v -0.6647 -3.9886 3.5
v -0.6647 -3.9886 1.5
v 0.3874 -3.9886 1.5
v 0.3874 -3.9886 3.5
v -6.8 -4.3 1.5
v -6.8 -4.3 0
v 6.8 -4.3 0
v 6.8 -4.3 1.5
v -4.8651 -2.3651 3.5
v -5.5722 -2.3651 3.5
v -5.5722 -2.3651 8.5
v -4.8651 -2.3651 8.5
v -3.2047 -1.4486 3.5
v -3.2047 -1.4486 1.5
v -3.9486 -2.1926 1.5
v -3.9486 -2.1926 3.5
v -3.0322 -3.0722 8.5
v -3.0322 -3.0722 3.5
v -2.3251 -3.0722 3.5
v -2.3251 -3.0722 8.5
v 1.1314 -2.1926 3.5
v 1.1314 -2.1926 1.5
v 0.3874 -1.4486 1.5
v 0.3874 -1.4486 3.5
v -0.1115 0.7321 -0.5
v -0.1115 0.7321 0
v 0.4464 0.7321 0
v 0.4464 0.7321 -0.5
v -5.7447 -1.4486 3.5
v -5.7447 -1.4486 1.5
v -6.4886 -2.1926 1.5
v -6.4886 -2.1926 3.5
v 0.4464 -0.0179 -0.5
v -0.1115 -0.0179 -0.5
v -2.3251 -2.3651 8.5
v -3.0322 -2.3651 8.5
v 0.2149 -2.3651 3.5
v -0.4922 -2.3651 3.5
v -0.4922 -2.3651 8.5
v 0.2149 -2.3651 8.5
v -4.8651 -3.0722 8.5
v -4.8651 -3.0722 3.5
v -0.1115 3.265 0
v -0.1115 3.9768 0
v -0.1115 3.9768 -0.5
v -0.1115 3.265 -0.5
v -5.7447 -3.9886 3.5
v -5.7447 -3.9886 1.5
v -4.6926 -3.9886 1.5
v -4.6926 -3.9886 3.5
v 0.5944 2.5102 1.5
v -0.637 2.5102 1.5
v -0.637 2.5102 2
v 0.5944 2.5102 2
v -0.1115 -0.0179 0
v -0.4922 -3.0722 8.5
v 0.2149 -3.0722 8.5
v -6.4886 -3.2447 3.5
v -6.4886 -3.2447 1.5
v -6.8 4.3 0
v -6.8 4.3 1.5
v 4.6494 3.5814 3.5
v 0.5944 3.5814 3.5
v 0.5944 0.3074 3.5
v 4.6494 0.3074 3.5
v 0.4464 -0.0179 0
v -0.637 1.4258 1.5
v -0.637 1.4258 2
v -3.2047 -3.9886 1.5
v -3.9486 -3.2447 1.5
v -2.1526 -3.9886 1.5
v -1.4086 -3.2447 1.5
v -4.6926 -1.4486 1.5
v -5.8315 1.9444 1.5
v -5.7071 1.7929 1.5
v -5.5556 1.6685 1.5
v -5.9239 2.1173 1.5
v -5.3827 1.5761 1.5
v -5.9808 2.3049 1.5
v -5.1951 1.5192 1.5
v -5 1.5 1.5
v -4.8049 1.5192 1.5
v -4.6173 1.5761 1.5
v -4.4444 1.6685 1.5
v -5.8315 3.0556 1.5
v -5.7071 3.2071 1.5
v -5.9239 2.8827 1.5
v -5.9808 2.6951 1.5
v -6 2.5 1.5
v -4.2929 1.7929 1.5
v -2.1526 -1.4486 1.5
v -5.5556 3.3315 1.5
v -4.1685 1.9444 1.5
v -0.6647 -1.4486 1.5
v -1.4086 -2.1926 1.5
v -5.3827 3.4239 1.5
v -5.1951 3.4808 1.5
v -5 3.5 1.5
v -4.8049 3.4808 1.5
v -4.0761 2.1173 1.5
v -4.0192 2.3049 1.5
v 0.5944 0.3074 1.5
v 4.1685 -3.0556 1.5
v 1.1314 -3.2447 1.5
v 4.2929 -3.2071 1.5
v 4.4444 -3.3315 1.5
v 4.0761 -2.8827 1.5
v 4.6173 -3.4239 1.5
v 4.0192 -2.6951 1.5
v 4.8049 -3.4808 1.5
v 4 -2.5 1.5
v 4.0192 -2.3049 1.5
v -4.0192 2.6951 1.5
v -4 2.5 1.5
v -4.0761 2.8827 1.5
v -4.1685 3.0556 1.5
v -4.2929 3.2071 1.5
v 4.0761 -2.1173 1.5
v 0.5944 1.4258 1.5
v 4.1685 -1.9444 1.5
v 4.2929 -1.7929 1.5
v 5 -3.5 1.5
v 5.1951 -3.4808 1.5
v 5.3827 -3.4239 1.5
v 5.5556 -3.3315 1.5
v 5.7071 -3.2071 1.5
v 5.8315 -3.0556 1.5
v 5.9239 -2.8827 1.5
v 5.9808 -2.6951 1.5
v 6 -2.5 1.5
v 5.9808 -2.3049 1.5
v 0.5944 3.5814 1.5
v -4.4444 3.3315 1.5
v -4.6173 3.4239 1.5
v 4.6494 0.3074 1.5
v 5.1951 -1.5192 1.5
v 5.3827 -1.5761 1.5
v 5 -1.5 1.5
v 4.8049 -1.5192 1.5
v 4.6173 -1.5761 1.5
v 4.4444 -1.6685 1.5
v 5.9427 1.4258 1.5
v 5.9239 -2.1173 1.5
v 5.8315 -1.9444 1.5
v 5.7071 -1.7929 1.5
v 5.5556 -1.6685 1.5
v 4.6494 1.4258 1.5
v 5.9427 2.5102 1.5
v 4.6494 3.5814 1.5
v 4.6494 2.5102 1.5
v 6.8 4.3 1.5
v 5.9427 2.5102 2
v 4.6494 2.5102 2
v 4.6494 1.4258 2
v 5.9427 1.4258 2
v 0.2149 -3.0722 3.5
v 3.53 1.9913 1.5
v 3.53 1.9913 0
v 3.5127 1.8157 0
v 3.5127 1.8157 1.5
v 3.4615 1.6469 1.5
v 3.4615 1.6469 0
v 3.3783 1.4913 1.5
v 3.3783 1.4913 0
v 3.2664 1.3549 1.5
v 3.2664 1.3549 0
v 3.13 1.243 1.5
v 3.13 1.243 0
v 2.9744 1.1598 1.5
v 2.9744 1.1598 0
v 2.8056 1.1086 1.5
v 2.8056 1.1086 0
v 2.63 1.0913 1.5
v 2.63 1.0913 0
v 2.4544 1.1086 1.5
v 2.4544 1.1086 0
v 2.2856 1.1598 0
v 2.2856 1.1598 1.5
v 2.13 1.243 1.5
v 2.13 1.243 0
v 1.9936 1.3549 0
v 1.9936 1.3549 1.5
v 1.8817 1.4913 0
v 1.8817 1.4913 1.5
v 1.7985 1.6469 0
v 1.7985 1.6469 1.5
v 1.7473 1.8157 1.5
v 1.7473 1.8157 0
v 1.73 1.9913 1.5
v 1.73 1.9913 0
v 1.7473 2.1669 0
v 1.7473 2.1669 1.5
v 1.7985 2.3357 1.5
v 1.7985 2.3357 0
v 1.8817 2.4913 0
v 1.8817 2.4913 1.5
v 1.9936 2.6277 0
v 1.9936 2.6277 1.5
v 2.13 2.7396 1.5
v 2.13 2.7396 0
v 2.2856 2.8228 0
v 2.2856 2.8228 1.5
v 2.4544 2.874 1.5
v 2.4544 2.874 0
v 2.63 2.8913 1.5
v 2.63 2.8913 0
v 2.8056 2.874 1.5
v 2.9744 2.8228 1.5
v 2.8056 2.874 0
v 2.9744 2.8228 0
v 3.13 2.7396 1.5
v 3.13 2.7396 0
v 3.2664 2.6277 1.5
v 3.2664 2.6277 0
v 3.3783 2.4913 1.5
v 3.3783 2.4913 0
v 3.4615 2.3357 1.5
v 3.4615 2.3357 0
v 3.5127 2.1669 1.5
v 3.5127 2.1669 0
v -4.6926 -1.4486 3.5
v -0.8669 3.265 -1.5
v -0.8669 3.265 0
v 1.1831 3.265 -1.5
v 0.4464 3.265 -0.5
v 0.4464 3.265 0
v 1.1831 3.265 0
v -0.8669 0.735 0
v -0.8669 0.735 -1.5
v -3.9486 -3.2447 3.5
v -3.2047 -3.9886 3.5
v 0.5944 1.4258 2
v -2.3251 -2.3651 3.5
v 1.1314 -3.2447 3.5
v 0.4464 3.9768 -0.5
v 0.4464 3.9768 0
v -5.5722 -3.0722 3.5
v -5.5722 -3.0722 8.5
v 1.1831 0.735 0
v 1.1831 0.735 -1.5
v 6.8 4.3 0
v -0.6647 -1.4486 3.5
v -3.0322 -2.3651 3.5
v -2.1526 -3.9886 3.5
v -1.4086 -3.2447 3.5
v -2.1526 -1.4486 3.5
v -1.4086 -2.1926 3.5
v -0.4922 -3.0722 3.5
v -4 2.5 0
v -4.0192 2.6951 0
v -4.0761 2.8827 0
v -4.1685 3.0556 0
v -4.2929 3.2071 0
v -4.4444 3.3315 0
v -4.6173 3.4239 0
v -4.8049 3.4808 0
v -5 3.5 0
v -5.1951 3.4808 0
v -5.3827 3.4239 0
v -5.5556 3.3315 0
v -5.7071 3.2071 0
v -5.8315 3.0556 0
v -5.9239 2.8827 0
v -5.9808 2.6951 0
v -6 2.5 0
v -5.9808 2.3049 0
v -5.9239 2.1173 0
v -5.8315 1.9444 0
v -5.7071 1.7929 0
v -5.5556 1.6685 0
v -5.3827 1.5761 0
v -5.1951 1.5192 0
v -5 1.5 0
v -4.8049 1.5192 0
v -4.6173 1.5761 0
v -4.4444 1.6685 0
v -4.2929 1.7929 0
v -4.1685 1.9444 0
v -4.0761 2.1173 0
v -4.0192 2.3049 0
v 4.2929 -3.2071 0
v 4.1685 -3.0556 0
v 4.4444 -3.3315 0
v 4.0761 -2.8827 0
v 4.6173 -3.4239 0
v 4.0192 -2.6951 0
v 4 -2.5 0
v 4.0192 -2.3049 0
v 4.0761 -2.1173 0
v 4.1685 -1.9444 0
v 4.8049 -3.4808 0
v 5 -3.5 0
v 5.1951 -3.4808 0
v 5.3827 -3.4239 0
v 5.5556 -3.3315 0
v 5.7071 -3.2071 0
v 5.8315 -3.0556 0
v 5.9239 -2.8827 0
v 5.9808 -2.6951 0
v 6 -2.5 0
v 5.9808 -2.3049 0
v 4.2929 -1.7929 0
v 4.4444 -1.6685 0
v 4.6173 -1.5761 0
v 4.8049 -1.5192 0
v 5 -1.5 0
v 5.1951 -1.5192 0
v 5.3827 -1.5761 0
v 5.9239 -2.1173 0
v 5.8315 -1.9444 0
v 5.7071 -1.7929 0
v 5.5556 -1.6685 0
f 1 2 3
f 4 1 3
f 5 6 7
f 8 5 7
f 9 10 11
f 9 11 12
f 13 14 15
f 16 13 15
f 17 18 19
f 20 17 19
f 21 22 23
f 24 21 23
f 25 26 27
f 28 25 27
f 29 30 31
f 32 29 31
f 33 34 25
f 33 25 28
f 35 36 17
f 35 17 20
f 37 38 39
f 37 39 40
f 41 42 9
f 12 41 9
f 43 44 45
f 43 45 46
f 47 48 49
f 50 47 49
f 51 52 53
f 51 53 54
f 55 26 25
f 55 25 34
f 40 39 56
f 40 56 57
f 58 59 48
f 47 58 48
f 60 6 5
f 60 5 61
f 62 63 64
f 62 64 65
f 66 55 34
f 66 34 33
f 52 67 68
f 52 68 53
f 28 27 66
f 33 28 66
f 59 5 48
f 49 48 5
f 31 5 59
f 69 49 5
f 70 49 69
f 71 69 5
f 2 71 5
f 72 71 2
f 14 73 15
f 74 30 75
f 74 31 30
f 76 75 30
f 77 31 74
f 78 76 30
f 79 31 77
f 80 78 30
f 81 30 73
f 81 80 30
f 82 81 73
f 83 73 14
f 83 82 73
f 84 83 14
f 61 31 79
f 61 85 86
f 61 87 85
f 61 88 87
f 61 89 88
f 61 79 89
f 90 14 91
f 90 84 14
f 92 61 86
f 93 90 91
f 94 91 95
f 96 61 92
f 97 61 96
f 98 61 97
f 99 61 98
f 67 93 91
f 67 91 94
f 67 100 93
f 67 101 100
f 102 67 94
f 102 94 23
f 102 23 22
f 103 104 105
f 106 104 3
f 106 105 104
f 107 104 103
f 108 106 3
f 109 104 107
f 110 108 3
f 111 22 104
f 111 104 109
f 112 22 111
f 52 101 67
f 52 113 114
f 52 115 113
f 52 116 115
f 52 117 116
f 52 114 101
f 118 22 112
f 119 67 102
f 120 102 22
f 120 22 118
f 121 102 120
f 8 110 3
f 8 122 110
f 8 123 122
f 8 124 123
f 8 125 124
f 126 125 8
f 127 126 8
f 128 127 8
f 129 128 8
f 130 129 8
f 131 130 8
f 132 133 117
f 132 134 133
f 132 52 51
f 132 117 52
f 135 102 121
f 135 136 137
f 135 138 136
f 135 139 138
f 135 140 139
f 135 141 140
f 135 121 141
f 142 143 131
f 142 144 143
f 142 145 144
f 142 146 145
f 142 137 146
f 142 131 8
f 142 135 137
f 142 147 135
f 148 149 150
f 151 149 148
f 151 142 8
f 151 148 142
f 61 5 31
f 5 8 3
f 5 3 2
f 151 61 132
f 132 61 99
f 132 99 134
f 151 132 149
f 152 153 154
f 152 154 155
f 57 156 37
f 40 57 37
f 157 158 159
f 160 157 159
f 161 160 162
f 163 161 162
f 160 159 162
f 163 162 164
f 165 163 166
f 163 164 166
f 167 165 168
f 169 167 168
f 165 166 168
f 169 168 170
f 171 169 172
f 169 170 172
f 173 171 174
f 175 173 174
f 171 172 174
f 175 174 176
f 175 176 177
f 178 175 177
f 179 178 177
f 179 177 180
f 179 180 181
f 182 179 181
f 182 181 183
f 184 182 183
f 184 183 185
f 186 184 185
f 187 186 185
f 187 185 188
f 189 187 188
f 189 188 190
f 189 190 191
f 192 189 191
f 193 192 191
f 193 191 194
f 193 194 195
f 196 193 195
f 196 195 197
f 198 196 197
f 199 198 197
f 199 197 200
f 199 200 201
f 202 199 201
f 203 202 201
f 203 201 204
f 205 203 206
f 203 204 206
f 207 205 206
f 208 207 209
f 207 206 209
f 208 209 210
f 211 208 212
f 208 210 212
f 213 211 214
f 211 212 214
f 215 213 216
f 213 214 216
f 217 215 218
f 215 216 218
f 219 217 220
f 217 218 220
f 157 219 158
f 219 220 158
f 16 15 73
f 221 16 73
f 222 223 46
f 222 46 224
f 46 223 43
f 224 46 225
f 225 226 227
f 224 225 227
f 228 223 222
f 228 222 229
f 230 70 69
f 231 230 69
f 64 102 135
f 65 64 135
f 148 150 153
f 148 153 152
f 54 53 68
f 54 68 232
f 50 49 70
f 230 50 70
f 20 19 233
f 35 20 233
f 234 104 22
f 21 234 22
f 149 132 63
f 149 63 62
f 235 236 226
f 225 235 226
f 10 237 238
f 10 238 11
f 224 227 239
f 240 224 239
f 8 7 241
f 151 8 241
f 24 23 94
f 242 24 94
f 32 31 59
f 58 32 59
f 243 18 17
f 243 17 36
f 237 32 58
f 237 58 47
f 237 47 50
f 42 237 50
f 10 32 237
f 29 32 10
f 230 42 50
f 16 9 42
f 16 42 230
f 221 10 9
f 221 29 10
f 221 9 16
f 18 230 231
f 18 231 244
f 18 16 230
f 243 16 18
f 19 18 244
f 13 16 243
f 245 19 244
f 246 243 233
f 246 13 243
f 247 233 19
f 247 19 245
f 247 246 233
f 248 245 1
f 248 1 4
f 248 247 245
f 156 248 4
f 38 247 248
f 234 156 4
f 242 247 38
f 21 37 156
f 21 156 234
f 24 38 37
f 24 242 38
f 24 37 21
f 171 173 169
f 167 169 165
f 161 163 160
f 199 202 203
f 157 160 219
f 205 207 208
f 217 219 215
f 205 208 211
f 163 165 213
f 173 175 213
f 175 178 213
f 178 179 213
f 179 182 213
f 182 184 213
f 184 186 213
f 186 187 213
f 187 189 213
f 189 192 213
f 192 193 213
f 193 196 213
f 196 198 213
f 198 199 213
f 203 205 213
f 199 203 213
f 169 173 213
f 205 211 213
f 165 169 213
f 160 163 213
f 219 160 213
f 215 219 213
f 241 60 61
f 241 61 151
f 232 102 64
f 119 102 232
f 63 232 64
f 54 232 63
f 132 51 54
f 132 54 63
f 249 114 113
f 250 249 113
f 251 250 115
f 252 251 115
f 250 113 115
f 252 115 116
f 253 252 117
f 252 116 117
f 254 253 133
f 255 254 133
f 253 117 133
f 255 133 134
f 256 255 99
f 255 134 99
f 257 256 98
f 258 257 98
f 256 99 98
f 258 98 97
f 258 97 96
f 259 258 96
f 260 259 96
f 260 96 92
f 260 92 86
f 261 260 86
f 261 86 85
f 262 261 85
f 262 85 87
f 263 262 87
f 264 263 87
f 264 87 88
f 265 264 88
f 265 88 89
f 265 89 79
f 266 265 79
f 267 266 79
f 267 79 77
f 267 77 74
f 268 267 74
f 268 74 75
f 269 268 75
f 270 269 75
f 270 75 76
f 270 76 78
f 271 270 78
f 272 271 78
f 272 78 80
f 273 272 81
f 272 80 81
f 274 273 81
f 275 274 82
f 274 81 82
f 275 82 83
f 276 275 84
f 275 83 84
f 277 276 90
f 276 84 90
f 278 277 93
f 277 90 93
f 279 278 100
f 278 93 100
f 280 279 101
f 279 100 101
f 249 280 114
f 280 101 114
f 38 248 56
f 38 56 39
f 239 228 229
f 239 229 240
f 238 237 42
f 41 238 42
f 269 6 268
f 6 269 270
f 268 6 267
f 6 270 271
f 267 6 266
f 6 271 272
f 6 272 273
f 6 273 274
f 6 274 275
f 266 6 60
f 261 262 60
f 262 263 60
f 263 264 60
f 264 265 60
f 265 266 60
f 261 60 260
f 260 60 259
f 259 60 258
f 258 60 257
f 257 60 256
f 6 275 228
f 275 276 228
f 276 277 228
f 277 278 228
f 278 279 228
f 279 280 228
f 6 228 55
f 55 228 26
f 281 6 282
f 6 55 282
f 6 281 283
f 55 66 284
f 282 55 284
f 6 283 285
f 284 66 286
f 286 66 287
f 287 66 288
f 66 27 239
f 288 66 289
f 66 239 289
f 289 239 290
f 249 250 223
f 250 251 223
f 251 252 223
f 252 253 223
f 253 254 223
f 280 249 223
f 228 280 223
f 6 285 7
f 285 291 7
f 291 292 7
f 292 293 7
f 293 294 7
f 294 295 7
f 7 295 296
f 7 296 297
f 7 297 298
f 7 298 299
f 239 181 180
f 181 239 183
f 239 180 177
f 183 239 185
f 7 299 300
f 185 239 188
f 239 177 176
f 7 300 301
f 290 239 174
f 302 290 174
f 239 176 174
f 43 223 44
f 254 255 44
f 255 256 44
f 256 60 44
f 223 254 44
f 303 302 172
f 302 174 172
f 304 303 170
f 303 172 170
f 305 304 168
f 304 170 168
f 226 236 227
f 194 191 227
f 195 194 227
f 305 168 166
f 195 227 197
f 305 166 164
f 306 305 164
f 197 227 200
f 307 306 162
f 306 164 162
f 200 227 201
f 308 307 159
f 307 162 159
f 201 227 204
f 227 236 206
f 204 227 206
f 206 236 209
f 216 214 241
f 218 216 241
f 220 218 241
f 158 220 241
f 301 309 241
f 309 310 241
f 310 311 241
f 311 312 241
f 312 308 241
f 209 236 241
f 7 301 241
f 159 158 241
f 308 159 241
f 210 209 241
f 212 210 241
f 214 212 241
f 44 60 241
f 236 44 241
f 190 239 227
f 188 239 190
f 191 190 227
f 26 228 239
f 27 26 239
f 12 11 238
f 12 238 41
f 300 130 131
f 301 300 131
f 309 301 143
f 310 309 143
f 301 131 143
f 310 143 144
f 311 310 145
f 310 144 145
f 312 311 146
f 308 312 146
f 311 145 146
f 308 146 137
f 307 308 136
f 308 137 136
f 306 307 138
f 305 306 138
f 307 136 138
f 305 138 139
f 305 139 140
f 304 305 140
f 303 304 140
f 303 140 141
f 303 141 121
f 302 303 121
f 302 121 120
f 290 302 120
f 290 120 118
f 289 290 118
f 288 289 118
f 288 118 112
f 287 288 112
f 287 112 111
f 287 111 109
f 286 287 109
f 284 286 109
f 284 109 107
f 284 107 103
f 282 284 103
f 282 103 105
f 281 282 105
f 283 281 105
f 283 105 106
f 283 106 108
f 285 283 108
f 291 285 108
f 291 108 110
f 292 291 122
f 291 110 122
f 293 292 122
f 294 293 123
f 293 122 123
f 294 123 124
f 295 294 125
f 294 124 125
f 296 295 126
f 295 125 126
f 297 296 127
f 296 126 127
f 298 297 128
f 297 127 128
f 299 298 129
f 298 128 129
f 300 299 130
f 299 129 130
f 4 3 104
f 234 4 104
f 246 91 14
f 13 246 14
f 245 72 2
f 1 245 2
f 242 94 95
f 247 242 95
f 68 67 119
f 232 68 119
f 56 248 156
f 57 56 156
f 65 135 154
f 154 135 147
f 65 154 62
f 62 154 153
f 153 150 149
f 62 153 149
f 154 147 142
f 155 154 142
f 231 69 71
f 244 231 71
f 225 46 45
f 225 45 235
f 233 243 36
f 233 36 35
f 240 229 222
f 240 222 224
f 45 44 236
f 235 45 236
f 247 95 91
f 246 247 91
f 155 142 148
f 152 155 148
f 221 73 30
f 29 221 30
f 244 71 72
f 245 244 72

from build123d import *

# Parameters (mm, degrees)
SKETCH_W               = 13.6
SKETCH_H               = 8.6
PAD_DEPTH              = 1.5
SKETCH001_R            = 1
POCKET_DEPTH           = 5
SKETCH002_R            = 0.9
POCKET001_DEPTH        = 5
SKETCH003_W            = 4.055027
SKETCH003_H            = 3.273927
PAD001_DEPTH           = 2
SKETCH004_W            = 1.366968
SKETCH004_H            = 1.084461
PAD002_DEPTH           = 0.5
SKETCH005_W            = 2.05
SKETCH005_H            = 2.53
PAD003_DEPTH           = 1.5
SKETCH006_W            = 0.55793
SKETCH006_H            = 0.749967
PAD004_DEPTH           = 0.5
PAD005_DEPTH           = 2
SKETCH008_W            = 0.707107
SKETCH008_H            = 0.707107
PAD006_DEPTH           = 5
LINEARPATTERN_COUNT    = 3
LINEARPATTERN_PITCH    = 2.54
LINEARPATTERN001_COUNT = 3
LINEARPATTERN001_PITCH = 2.54


with BuildPart() as part:
    # Sketch → Pad (new body)
    with BuildSketch(Plane.XY):
        Rectangle(SKETCH_W, SKETCH_H)
    extrude(amount=PAD_DEPTH)

    # Sketch001 (on Face6 of Pad) → Pocket (cut)
    with BuildSketch(Plane.XY.offset(1.5)):
        with Locations((-5, 2.5)):
            Circle(SKETCH001_R)
        with Locations((5, -2.5)):
            Circle(SKETCH001_R)
    extrude(amount=-POCKET_DEPTH, mode=Mode.SUBTRACT)

    # Sketch002 (on Face4 of Pocket) → Pocket001 (cut)
    with BuildSketch(Plane(origin=(0, 0, 0), x_dir=(1, 0, 0), z_dir=(0, 0, -1))):
        with Locations((2.63, -1.991314)):
            Circle(SKETCH002_R)
    extrude(amount=-POCKET001_DEPTH, mode=Mode.SUBTRACT)

    # Sketch003 (on Face5 of Pocket001) → Pad001 (join)
    with BuildSketch(Plane.XY.offset(1.5)):
        with Locations((2.621891, 1.944408)):
            Rectangle(SKETCH003_W, SKETCH003_H)
    extrude(amount=PAD001_DEPTH)

    # Sketch004 (on Face5 of Pad001) → Pad002 (join)
    with BuildSketch(Plane.XY.offset(1.5)):
        with Locations((0.04648, 1.968005)):
            Rectangle(SKETCH004_W, SKETCH004_H)
        with Locations((5.259186, 1.968005)):
            Rectangle(SKETCH004_W, SKETCH004_H)
    extrude(amount=PAD002_DEPTH)

    # Sketch005 (on Face4 of Pad002) → Pad003 (join)
    with BuildSketch(Plane(origin=(0, 0, 0), x_dir=(1, 0, 0), z_dir=(0, 0, -1))):
        with Locations((0.15814, -2)):
            Rectangle(SKETCH005_W, SKETCH005_H)
    extrude(amount=PAD003_DEPTH)

    # Sketch006 (on Face4 of Pad003) → Pad004 (join)
    with BuildSketch(Plane(origin=(0, 0, 0), x_dir=(1, 0, 0), z_dir=(0, 0, -1))):
        with Locations((0.167423, -0.357102)):
            Rectangle(SKETCH006_W, SKETCH006_H)
        with Locations((0.167423, -3.601865)):
            Rectangle(SKETCH006_W, SKETCH006_H)
    extrude(amount=PAD004_DEPTH)

    # Sketch007 (on Face5 of Pad004) → Pad005 (join)
    with BuildSketch(Plane.XY.offset(1.5)):
        Polygon((-4.692553, -1.448605), (-5.744656, -1.448605), (-6.488605, -2.192553), (-6.488605, -3.244656), (-5.744656, -3.988605), (-4.692553, -3.988605), (-3.948605, -3.244656), (-3.948605, -2.192553), align=None)
    pad005 = extrude(amount=PAD005_DEPTH)

    # Sketch008 (on Face46 of Pad005) → Pad006 (join)
    with BuildSketch(Plane.XY.offset(3.5)):
        with Locations((-5.218604, -2.718604)):
            Rectangle(SKETCH008_W, SKETCH008_H)
    pad006 = extrude(amount=PAD006_DEPTH)

    # LinearPattern: Pad005 ×3
    with Locations(*[(i * LINEARPATTERN_PITCH, 0, 0) for i in range(1, LINEARPATTERN_COUNT)]):
        add(pad005)

    # LinearPattern001: Pad006 ×3
    with Locations(*[(i * LINEARPATTERN001_PITCH, 0, 0) for i in range(1, LINEARPATTERN001_COUNT)]):
        add(pad006)


solid = part.part
